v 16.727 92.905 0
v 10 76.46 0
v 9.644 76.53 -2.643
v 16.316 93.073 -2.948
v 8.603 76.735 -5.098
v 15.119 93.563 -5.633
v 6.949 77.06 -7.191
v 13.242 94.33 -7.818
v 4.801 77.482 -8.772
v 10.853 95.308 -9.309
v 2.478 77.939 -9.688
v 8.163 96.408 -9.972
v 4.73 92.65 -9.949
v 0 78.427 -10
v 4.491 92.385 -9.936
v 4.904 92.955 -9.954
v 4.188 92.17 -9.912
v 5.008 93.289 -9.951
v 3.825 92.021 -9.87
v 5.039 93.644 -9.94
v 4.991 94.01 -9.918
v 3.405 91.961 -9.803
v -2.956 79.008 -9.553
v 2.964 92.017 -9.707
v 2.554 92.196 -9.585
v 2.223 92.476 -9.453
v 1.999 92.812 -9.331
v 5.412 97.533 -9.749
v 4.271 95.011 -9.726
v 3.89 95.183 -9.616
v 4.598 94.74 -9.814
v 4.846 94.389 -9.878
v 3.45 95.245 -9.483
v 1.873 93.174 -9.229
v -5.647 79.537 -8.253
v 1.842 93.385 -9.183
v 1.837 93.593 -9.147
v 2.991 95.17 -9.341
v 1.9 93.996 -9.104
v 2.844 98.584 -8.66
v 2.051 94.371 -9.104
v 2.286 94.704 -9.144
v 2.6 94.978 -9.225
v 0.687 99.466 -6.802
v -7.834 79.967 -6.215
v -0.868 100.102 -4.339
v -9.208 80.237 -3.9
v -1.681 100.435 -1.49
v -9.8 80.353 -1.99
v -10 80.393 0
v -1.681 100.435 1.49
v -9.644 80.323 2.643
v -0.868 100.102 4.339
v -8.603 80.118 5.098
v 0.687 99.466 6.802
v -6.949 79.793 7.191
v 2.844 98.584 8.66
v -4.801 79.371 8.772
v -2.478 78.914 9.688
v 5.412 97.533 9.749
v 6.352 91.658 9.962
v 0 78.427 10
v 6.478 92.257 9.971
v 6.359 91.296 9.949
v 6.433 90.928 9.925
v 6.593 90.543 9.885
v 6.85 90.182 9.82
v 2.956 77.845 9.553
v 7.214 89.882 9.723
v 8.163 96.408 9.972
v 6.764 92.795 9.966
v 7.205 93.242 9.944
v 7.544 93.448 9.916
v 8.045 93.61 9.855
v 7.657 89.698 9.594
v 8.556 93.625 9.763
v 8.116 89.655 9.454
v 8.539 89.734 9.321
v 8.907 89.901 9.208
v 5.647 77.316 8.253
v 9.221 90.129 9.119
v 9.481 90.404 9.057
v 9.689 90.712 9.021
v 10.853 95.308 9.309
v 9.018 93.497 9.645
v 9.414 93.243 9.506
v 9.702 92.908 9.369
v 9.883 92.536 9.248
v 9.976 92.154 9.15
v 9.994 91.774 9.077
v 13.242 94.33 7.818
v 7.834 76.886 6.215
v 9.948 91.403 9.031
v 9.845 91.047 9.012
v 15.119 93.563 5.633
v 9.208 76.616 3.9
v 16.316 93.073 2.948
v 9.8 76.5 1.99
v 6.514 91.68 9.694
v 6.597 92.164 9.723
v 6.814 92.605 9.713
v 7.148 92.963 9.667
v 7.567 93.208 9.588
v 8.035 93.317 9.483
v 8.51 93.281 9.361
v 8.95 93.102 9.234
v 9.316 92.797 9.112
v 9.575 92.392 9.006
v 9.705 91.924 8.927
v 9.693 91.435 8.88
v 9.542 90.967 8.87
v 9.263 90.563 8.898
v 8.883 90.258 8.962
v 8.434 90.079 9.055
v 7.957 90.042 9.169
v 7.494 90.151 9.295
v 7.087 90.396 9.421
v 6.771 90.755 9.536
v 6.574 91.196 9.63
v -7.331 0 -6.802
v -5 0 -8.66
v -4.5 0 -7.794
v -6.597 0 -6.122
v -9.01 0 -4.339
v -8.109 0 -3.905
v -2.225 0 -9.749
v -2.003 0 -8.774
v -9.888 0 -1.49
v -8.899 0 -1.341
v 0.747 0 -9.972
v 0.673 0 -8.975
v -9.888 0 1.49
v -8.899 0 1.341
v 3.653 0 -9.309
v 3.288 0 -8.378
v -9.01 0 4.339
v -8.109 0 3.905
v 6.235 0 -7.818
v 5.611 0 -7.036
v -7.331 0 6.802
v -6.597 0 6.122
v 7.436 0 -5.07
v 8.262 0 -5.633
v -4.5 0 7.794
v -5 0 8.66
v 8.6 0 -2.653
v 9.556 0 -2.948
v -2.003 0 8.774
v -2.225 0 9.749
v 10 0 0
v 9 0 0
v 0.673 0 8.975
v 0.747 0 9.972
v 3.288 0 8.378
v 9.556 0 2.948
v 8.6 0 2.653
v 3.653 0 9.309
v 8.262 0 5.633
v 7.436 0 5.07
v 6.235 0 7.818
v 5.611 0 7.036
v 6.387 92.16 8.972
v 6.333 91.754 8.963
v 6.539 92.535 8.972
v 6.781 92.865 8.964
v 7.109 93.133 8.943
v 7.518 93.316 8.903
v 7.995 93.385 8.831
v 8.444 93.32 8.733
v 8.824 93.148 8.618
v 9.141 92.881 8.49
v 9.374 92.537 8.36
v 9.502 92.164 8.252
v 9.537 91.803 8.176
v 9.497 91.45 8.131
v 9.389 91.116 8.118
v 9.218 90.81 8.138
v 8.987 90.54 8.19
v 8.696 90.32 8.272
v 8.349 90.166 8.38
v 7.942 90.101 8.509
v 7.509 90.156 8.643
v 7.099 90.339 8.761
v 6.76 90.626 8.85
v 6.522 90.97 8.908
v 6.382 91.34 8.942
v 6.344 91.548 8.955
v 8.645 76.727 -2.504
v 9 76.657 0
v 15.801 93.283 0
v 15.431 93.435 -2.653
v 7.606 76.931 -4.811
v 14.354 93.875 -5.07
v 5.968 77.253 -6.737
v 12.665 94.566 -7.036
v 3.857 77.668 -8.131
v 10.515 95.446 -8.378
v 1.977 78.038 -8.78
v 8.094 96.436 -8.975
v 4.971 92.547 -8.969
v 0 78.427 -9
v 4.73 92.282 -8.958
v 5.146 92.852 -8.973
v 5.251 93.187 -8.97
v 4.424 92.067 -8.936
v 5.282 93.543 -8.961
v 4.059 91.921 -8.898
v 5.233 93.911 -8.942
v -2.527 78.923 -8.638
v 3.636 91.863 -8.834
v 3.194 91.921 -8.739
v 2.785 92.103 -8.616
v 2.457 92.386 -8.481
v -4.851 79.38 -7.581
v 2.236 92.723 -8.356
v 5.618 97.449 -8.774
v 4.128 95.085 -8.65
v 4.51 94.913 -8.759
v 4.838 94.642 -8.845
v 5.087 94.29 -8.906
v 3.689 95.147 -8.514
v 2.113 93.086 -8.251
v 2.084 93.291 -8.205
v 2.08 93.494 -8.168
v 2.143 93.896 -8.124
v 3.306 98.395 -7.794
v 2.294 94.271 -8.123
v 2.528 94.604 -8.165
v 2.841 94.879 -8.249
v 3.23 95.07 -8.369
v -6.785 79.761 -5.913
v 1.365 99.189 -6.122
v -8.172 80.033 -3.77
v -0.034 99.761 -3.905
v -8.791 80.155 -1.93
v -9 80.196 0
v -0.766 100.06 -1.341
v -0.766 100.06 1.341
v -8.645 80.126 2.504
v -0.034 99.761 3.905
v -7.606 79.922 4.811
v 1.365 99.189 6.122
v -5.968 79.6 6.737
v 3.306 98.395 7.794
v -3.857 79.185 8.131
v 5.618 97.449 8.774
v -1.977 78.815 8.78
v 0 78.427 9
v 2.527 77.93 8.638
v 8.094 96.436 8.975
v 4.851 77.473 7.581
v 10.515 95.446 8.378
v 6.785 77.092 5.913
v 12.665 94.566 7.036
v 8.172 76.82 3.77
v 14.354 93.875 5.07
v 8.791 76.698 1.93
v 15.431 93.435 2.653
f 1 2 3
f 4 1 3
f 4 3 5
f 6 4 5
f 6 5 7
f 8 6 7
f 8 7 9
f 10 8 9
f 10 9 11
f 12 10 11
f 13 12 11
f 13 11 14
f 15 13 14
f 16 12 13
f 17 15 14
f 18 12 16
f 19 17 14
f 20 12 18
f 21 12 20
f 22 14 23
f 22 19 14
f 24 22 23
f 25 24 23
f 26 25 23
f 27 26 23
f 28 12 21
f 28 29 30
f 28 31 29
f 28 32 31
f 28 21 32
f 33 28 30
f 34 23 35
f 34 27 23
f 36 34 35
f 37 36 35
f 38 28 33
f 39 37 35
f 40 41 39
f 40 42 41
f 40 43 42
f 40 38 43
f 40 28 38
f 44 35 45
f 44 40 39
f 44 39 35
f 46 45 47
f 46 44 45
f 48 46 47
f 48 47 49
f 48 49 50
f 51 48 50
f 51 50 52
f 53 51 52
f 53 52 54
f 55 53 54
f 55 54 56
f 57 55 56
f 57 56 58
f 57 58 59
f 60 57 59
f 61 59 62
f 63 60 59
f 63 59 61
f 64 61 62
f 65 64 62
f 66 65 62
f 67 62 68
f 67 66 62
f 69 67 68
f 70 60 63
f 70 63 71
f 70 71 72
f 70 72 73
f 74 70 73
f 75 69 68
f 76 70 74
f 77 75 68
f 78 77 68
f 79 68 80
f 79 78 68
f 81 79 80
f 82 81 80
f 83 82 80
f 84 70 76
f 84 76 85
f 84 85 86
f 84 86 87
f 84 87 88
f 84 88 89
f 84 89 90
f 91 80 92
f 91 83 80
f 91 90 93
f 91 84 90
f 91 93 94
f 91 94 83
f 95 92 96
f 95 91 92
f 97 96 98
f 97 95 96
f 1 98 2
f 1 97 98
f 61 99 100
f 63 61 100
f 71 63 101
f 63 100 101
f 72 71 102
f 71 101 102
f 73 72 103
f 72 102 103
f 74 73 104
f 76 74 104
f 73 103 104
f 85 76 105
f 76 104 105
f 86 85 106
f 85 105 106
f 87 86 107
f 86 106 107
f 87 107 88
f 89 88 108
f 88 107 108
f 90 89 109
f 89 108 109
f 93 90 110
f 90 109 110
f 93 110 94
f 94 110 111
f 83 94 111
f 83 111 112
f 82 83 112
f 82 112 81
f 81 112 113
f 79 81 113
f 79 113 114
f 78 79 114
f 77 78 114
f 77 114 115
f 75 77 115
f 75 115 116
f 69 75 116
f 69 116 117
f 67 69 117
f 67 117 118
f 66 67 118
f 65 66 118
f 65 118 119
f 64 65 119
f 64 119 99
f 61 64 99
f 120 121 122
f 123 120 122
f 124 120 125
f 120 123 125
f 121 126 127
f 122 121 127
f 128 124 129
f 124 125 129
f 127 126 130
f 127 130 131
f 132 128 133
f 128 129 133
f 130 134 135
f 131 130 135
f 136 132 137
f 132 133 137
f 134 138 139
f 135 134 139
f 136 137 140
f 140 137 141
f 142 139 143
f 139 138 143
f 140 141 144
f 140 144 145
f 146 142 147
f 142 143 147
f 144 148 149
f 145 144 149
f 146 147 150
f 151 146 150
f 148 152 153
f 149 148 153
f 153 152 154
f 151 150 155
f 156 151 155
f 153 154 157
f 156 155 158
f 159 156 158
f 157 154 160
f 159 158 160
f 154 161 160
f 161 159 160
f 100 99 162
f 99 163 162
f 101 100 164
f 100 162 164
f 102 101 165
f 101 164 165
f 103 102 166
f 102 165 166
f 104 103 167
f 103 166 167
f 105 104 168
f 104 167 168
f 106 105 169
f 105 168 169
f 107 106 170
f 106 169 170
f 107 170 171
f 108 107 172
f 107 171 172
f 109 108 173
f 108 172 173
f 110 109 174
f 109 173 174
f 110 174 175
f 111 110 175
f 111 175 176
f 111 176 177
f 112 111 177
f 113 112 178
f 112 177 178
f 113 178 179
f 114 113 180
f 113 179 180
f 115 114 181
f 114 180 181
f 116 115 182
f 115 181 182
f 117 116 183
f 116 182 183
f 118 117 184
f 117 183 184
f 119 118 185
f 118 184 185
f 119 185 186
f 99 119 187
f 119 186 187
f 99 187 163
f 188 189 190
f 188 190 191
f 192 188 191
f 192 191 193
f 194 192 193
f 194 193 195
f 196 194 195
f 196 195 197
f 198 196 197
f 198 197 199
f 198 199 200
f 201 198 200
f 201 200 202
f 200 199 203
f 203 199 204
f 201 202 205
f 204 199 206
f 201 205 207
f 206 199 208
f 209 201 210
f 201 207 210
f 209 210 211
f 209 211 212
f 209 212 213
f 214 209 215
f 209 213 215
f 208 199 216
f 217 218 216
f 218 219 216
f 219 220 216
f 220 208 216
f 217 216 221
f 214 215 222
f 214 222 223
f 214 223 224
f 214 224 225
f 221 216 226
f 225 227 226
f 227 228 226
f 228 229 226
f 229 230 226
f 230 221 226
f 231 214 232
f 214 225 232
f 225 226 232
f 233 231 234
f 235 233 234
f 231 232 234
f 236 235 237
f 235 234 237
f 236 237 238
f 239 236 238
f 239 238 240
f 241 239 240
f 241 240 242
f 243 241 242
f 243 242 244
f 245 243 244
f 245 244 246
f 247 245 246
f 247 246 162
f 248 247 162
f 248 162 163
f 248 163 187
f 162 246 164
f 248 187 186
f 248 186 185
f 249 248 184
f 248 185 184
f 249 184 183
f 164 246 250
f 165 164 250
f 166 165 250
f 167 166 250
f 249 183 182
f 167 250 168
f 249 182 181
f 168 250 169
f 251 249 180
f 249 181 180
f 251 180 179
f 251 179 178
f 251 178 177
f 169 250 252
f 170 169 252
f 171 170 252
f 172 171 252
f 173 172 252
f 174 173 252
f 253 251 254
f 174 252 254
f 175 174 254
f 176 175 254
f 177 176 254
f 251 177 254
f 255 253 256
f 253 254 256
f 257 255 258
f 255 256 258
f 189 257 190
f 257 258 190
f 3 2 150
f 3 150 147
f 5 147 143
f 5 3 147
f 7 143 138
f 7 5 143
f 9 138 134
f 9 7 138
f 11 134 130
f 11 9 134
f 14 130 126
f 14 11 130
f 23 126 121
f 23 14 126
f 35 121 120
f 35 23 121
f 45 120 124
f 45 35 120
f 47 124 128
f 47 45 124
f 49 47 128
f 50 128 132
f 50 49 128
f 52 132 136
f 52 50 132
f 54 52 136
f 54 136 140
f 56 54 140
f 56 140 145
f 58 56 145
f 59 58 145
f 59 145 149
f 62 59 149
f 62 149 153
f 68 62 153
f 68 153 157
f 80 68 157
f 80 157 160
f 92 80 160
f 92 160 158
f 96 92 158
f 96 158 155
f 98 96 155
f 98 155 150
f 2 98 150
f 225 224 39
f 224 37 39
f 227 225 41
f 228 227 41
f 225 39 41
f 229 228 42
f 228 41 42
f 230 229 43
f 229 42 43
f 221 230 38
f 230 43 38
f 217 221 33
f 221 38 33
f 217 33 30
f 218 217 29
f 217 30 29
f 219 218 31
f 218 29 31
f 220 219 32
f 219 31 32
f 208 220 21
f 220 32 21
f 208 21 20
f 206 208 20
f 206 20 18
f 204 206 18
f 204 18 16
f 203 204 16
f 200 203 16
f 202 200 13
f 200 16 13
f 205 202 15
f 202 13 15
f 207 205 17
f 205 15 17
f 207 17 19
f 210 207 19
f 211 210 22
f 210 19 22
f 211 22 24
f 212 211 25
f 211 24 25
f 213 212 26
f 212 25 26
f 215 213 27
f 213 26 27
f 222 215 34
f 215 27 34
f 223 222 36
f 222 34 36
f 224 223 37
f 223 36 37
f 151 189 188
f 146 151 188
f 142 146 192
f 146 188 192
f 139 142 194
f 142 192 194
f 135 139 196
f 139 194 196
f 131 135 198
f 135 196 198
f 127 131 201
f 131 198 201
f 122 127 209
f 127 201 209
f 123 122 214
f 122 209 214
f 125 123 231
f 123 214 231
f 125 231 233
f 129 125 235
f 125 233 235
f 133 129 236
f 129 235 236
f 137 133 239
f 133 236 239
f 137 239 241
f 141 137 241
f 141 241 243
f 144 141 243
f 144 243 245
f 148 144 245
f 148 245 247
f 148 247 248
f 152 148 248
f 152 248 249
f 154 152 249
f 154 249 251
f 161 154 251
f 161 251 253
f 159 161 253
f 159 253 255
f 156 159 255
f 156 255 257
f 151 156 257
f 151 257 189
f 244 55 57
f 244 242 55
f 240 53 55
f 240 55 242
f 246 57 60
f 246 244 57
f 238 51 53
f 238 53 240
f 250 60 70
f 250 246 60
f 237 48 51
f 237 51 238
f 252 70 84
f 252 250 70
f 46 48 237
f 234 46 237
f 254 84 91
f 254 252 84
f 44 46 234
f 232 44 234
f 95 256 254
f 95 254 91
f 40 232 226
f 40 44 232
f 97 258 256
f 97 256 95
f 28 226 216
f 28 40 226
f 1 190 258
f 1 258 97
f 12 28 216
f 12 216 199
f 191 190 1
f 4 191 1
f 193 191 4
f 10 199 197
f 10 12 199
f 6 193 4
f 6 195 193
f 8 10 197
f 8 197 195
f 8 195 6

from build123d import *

# Parameters (mm, degrees)
SKETCH_1_R          = 10
SKETCH_1_R_2        = 9
M4X0_71_D           = 3.3
M4X0_71_CSINK_D     = 4.05
M4X0_71_CSINK_ANGLE = 90


with BuildPart() as part:
    # По траектории2: sweep along a path in Эскиз2
    with BuildLine(Plane.XY) as sweep_2_path:
        Line((0, 0), (0, 78.426510273))
        Line((0, 78.426510273), (7.471377296, 96.690895762))
    # Эскиз1 → По траектории2 (sweep)
    with BuildSketch(Plane(origin=(0, 0, 0), x_dir=(1, 0, 0), z_dir=(0, 1, 0))):
        Circle(SKETCH_1_R)
        Circle(SKETCH_1_R_2, mode=Mode.SUBTRACT)
    sweep(path=sweep_2_path.line, transition=Transition.RIGHT)

    # Отверстие обработанное метчиком M4x0.71 (through all)
    with Locations(Plane(origin=(8.205564009, 91.642912959, 9.658566578), x_dir=(0.970537064, 0, -0.240951879), z_dir=(0.23978989, -0.098090393, 0.965856658))):
        with Locations((0, 0)):
            CounterSinkHole(M4X0_71_D / 2, M4X0_71_CSINK_D / 2, counter_sink_angle=M4X0_71_CSINK_ANGLE)


solid = part.part
